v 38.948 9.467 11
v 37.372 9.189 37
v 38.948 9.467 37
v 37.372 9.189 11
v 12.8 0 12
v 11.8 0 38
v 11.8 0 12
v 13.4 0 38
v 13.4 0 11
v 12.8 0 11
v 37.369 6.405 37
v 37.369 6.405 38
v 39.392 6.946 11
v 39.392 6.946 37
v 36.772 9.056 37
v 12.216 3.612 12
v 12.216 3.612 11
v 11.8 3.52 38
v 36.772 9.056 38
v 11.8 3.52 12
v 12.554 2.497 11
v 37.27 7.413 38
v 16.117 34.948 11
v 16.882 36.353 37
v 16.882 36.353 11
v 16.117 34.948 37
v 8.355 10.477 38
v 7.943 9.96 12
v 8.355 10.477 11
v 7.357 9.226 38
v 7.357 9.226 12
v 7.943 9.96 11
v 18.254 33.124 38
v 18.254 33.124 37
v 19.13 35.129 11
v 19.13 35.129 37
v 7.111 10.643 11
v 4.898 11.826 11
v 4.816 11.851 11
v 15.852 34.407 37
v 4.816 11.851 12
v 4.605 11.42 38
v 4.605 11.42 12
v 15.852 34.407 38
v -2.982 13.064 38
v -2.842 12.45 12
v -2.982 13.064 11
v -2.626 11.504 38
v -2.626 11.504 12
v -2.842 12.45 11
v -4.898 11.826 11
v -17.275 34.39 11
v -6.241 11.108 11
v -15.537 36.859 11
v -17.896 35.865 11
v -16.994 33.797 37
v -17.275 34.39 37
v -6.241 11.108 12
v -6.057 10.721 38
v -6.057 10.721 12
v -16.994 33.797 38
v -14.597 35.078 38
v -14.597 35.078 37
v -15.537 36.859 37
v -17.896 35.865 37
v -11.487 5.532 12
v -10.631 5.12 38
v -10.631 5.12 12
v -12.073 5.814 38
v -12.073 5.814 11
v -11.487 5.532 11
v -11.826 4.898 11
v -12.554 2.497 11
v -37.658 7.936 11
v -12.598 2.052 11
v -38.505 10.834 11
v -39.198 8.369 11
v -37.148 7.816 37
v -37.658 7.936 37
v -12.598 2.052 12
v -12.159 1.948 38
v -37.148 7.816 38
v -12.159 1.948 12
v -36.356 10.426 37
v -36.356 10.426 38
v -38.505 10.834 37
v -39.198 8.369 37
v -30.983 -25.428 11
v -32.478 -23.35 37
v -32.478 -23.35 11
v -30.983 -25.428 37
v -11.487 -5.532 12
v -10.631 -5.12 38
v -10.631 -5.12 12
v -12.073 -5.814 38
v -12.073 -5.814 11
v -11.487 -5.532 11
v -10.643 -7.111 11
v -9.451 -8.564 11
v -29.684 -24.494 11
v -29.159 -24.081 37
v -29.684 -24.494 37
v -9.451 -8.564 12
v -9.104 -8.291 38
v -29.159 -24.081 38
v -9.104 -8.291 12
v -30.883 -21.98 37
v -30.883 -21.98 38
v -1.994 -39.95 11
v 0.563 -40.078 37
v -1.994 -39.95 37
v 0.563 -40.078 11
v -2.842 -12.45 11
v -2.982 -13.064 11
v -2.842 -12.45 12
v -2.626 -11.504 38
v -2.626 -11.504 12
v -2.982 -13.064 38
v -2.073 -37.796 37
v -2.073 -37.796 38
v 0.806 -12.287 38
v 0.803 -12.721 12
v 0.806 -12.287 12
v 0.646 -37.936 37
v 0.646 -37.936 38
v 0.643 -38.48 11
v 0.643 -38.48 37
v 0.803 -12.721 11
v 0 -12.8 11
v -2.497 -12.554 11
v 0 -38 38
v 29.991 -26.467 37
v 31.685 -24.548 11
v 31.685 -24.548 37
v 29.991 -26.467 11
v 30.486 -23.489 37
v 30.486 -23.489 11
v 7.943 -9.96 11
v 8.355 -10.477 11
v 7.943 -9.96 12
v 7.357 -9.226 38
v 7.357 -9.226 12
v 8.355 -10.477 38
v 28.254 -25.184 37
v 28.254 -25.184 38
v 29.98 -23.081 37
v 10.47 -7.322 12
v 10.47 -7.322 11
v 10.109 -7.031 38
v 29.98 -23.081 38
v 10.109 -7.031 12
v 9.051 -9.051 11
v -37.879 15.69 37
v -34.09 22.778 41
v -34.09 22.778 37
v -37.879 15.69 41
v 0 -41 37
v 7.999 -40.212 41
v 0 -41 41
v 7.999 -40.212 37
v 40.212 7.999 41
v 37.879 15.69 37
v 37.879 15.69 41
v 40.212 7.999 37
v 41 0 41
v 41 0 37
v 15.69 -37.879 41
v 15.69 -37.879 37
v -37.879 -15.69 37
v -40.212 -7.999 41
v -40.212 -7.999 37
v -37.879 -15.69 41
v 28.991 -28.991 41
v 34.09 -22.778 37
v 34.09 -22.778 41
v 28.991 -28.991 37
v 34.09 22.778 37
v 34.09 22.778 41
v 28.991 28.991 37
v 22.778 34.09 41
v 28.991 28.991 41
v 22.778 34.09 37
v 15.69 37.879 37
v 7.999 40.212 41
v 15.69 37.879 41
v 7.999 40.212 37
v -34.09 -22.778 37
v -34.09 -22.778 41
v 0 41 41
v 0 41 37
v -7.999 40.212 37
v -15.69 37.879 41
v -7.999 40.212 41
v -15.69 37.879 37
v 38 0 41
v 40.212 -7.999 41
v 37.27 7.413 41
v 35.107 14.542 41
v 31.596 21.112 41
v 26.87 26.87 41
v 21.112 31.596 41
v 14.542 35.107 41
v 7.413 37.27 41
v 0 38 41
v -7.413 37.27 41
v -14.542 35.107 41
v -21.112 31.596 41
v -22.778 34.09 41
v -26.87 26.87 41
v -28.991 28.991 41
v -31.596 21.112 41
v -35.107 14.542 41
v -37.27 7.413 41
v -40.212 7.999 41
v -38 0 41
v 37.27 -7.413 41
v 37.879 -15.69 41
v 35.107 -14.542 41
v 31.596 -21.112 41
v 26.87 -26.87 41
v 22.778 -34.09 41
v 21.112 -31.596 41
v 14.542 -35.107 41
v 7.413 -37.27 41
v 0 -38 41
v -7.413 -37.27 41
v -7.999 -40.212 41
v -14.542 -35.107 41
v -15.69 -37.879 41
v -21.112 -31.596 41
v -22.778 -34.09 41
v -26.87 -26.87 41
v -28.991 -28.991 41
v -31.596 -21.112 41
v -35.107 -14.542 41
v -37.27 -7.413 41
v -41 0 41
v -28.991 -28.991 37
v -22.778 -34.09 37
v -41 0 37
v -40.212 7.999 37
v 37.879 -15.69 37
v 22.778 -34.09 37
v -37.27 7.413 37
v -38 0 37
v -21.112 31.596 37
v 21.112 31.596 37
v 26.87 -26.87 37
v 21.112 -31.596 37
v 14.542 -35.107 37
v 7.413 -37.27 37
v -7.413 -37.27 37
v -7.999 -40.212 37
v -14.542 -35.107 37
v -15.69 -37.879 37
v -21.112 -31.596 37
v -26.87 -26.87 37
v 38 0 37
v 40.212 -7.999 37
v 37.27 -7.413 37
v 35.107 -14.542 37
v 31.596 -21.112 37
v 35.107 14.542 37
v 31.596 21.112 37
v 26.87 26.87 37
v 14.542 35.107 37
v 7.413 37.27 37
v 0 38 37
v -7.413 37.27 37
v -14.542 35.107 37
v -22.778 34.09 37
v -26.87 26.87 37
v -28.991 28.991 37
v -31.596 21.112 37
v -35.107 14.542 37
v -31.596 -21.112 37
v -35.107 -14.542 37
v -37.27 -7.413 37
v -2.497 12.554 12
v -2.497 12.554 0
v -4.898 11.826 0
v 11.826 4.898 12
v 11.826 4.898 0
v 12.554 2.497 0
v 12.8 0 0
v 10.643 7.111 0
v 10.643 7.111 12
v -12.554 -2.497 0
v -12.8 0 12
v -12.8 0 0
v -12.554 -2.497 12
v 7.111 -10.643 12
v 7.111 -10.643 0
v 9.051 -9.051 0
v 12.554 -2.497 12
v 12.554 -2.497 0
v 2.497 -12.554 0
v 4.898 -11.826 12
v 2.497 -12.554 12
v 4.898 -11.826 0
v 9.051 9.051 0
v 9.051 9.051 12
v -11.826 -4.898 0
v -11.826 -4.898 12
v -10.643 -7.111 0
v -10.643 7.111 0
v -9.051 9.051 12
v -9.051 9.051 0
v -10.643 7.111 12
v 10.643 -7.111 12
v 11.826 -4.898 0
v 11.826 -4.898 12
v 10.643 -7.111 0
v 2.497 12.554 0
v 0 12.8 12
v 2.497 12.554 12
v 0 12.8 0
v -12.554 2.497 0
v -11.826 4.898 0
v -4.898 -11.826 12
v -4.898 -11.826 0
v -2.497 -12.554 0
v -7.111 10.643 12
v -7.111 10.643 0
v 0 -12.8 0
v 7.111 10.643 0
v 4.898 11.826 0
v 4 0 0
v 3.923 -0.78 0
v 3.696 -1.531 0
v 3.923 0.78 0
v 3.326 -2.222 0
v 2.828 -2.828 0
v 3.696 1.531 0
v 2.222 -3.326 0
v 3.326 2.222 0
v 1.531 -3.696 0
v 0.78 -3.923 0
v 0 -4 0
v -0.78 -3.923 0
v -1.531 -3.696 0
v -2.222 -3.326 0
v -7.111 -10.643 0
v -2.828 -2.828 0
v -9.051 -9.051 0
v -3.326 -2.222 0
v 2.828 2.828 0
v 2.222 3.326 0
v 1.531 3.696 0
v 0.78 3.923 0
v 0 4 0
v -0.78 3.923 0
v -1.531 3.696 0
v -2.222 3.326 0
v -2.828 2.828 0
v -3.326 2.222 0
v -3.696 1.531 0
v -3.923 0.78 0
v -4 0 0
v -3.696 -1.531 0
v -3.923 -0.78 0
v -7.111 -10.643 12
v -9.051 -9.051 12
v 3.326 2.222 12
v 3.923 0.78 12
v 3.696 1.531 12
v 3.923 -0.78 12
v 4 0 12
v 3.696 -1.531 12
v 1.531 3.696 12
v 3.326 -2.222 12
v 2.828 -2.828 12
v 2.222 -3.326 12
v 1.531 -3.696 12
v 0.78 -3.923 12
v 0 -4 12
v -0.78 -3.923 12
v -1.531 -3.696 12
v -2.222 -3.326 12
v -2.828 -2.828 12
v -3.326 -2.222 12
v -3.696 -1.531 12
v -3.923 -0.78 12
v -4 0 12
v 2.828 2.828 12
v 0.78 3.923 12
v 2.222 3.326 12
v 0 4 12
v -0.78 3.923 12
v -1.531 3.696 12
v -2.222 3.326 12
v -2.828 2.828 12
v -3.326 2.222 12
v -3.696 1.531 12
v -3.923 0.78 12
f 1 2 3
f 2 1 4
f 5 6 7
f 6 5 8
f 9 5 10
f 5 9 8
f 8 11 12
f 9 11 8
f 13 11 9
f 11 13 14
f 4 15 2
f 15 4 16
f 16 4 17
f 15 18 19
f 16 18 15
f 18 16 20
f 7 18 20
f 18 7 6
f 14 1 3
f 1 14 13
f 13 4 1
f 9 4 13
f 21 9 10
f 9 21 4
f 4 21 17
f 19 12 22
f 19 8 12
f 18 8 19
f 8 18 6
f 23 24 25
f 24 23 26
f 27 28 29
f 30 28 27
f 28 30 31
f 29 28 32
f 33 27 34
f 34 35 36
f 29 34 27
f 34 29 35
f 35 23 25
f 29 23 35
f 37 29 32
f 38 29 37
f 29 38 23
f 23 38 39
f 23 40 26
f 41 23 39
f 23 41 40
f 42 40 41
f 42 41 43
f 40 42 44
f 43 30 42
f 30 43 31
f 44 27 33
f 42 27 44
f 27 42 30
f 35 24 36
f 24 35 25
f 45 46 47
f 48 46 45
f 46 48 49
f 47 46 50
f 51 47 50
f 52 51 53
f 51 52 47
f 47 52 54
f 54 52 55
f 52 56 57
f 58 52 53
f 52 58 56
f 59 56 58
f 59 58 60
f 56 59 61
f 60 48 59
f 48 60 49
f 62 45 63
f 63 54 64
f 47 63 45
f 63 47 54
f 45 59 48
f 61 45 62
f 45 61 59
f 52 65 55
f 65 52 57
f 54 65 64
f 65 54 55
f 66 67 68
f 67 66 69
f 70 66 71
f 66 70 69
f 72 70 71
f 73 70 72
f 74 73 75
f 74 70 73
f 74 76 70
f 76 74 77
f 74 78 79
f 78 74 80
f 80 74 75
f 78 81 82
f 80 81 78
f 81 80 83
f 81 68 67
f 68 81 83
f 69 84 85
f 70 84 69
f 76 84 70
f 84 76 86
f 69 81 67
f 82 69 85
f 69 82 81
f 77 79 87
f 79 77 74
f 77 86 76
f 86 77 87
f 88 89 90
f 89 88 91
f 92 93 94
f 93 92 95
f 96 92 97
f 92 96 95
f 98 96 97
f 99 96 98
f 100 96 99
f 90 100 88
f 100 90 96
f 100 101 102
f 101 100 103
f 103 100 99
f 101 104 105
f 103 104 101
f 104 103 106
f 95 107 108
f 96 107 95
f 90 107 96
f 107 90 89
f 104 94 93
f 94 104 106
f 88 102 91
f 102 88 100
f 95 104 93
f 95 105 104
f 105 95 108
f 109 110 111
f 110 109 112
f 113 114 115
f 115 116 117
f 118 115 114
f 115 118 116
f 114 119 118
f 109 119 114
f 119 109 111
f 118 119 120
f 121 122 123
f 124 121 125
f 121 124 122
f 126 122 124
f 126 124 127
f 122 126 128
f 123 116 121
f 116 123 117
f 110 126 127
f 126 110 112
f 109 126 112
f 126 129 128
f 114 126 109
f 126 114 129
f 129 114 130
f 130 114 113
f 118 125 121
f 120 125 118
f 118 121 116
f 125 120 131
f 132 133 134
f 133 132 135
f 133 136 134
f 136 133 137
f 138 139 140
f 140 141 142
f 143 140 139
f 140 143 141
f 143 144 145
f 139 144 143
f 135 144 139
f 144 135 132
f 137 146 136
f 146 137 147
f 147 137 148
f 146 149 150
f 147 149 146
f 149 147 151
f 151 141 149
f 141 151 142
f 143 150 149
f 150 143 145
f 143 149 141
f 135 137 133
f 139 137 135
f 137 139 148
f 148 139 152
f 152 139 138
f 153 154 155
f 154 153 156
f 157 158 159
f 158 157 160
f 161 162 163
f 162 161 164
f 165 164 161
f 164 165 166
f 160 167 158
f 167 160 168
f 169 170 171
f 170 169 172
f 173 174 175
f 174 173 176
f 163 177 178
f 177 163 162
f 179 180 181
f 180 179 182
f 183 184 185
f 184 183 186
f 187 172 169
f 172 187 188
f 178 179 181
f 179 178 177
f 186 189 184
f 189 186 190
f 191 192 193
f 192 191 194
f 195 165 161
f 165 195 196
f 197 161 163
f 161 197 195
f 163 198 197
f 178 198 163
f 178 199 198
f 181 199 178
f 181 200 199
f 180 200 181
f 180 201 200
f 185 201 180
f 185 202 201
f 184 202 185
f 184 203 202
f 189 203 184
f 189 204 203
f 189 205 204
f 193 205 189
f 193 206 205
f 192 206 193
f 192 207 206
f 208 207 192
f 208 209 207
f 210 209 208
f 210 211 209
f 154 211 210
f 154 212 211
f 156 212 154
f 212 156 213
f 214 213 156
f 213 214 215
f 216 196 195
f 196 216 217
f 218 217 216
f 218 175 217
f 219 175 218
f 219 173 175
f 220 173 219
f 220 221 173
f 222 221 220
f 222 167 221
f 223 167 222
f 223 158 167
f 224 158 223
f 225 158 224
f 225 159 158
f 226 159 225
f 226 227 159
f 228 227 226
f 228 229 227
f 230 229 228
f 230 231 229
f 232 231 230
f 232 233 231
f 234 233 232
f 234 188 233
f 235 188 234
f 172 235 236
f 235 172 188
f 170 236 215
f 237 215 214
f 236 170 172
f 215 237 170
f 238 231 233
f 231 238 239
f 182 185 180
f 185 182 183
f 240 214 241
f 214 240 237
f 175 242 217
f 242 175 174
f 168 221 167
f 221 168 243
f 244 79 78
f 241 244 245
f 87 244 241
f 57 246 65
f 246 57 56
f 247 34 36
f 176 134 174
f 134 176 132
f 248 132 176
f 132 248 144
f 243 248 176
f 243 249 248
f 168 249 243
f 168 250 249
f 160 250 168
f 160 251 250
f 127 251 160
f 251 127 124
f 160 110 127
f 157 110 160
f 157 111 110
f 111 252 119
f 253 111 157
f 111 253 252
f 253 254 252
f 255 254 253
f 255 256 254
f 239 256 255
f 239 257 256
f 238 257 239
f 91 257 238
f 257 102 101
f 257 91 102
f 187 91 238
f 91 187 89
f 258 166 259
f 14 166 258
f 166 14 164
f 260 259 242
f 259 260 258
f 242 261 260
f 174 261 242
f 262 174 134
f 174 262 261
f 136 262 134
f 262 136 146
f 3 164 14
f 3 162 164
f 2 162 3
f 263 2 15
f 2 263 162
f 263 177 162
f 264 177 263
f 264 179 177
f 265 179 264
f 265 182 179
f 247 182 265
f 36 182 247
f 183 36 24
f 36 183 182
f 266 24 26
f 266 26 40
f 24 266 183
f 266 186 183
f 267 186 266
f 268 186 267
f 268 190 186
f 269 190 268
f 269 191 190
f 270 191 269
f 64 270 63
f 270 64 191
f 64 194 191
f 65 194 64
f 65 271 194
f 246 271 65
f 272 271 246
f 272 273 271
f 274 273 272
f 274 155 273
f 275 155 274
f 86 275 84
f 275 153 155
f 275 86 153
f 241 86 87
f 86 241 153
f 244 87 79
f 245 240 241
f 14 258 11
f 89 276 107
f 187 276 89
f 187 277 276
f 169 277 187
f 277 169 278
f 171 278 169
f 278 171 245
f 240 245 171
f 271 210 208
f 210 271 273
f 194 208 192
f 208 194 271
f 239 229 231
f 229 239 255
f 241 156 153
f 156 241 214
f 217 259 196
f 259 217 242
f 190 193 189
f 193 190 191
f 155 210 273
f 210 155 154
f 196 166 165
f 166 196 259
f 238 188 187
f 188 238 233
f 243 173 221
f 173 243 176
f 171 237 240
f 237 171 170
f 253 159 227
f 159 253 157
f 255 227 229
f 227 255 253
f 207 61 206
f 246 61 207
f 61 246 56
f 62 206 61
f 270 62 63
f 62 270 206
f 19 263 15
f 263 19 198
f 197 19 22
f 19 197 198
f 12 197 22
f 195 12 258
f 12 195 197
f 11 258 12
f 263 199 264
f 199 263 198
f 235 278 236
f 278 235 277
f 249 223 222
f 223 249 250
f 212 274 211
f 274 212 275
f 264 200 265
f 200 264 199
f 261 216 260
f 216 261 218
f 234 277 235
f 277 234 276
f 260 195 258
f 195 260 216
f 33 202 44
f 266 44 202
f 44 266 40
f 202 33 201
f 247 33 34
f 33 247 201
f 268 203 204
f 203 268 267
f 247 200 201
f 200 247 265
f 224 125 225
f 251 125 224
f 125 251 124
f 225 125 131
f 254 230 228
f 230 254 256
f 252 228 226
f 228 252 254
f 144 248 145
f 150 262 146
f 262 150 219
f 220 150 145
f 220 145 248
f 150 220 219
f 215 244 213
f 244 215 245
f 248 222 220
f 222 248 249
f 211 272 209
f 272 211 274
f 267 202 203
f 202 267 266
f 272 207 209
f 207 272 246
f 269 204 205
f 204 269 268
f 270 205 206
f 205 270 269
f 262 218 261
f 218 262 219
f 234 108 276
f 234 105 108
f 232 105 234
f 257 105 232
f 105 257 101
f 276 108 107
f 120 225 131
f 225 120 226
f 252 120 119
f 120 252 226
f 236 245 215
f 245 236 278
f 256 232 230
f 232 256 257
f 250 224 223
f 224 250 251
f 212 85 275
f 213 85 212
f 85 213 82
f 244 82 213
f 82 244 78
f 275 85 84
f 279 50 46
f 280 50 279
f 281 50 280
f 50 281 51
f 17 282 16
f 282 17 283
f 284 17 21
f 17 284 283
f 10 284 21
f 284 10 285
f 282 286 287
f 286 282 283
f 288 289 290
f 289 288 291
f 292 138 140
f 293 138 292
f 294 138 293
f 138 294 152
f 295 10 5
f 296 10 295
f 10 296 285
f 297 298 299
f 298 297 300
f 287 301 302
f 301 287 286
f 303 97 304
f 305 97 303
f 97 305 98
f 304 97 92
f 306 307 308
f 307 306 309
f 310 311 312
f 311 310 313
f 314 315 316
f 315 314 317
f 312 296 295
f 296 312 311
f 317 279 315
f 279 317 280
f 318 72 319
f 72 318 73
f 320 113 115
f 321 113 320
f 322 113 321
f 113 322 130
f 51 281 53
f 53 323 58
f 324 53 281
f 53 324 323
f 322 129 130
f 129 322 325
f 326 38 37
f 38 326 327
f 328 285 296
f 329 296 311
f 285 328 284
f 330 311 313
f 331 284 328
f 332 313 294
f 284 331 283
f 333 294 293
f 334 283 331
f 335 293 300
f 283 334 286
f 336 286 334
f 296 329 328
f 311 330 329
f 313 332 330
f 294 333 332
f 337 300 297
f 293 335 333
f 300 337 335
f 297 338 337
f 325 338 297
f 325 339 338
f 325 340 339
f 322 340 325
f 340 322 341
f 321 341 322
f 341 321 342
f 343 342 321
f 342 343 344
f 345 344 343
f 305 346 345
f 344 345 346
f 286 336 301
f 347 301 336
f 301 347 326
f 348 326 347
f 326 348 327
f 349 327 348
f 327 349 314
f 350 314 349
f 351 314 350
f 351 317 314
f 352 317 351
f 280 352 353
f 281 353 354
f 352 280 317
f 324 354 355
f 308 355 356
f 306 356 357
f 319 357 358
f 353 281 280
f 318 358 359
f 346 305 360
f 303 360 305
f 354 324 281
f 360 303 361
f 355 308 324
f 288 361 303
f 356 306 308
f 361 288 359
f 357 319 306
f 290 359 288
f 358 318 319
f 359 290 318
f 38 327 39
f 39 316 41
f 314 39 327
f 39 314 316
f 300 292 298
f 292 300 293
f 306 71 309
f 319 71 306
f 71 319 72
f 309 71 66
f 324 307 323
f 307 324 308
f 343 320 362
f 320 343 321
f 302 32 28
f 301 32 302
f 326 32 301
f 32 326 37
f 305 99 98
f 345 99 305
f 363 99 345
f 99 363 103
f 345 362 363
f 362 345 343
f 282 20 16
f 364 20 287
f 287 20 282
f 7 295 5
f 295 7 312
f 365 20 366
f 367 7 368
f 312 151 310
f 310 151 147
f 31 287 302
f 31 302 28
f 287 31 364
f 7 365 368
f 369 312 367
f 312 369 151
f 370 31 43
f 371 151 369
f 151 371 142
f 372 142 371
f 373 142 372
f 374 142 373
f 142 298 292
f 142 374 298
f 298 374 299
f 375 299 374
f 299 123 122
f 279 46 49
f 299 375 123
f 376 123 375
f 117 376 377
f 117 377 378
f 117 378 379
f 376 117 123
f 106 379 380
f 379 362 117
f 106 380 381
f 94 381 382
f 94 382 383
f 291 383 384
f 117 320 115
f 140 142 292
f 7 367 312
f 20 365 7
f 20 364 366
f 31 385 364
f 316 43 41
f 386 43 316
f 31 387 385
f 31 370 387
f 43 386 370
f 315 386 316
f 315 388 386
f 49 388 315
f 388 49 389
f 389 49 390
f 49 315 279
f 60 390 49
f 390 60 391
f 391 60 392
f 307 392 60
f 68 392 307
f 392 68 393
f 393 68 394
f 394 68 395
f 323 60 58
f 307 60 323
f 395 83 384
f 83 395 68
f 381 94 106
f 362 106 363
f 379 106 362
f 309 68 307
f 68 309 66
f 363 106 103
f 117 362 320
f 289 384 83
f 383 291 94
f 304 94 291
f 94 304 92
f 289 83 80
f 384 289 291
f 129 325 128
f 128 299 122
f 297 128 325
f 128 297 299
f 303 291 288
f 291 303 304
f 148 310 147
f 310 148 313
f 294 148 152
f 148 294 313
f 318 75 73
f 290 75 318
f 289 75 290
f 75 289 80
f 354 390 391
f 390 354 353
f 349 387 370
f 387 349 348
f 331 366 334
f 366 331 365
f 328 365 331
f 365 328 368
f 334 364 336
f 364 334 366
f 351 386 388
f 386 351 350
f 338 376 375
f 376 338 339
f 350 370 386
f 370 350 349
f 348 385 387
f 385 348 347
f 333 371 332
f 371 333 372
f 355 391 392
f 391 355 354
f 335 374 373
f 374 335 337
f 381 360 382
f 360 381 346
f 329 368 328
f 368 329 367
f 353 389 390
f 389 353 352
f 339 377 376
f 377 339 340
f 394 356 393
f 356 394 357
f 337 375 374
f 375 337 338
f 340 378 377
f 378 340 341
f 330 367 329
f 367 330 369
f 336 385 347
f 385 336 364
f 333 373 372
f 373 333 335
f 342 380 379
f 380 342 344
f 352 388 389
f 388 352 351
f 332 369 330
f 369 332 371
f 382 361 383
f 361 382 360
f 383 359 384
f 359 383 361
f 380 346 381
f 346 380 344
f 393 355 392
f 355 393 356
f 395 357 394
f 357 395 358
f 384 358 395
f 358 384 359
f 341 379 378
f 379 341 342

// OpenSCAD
$fn = 32;

// ----------------------------------------------------------------------
// Impeller: 80 mm, 7 blades, 41 mm tall
// ----------------------------------------------------------------------

// --- parameters (mm) ---
hub_d = 25.6;             // hub diameter
hub_h = 12;               // hub height
imp_d = 80;               // outer diameter over the blades
blades = 7;               // number of blades
blade_t = 1.6;            // blade thickness
blade_h = 26;             // blade height
blade_in_r = 11.8;        // blade root radius
blade_out_r = 38.4;       // blade tip radius
sweep = 10;               // blade sweep, degrees
bore_d = 8;               // shaft bore
shroud_h = 3;             // shroud ring thickness
shroud_d = 82;            // shroud outside diameter

module hub() {
  cylinder(h = hub_h, d = hub_d);
}

module blade() {
  /* blade swept between two boxes: hull of the root and the tip section */
  hull() {
    translate([blade_in_r, 0, hub_h - 1])
      cube([blade_t, blade_t * 2.2, blade_h + 1], center = false);
    rotate([0, 0, sweep])
      translate([blade_out_r, 0, hub_h - 1])
        cube([blade_t, blade_t * 1.6, blade_h + 1], center = false);
  }
}

module blades() {
  for (i = [0 : blades - 1])
    rotate([0, 0, i * 360 / blades]) blade();
}

module shroud() {
  translate([0, 0, hub_h + blade_h - 1])
    difference() {
      cylinder(h = shroud_h + 1, d = shroud_d);
      translate([0, 0, -1]) cylinder(h = shroud_h + 3, d = shroud_d - 2 * 3);
    }
}

difference() {
  union() {
    hub();
    blades();
    shroud();
  }
  translate([0, 0, -1]) cylinder(h = hub_h + blade_h + shroud_h + 3, d = bore_d);
}
